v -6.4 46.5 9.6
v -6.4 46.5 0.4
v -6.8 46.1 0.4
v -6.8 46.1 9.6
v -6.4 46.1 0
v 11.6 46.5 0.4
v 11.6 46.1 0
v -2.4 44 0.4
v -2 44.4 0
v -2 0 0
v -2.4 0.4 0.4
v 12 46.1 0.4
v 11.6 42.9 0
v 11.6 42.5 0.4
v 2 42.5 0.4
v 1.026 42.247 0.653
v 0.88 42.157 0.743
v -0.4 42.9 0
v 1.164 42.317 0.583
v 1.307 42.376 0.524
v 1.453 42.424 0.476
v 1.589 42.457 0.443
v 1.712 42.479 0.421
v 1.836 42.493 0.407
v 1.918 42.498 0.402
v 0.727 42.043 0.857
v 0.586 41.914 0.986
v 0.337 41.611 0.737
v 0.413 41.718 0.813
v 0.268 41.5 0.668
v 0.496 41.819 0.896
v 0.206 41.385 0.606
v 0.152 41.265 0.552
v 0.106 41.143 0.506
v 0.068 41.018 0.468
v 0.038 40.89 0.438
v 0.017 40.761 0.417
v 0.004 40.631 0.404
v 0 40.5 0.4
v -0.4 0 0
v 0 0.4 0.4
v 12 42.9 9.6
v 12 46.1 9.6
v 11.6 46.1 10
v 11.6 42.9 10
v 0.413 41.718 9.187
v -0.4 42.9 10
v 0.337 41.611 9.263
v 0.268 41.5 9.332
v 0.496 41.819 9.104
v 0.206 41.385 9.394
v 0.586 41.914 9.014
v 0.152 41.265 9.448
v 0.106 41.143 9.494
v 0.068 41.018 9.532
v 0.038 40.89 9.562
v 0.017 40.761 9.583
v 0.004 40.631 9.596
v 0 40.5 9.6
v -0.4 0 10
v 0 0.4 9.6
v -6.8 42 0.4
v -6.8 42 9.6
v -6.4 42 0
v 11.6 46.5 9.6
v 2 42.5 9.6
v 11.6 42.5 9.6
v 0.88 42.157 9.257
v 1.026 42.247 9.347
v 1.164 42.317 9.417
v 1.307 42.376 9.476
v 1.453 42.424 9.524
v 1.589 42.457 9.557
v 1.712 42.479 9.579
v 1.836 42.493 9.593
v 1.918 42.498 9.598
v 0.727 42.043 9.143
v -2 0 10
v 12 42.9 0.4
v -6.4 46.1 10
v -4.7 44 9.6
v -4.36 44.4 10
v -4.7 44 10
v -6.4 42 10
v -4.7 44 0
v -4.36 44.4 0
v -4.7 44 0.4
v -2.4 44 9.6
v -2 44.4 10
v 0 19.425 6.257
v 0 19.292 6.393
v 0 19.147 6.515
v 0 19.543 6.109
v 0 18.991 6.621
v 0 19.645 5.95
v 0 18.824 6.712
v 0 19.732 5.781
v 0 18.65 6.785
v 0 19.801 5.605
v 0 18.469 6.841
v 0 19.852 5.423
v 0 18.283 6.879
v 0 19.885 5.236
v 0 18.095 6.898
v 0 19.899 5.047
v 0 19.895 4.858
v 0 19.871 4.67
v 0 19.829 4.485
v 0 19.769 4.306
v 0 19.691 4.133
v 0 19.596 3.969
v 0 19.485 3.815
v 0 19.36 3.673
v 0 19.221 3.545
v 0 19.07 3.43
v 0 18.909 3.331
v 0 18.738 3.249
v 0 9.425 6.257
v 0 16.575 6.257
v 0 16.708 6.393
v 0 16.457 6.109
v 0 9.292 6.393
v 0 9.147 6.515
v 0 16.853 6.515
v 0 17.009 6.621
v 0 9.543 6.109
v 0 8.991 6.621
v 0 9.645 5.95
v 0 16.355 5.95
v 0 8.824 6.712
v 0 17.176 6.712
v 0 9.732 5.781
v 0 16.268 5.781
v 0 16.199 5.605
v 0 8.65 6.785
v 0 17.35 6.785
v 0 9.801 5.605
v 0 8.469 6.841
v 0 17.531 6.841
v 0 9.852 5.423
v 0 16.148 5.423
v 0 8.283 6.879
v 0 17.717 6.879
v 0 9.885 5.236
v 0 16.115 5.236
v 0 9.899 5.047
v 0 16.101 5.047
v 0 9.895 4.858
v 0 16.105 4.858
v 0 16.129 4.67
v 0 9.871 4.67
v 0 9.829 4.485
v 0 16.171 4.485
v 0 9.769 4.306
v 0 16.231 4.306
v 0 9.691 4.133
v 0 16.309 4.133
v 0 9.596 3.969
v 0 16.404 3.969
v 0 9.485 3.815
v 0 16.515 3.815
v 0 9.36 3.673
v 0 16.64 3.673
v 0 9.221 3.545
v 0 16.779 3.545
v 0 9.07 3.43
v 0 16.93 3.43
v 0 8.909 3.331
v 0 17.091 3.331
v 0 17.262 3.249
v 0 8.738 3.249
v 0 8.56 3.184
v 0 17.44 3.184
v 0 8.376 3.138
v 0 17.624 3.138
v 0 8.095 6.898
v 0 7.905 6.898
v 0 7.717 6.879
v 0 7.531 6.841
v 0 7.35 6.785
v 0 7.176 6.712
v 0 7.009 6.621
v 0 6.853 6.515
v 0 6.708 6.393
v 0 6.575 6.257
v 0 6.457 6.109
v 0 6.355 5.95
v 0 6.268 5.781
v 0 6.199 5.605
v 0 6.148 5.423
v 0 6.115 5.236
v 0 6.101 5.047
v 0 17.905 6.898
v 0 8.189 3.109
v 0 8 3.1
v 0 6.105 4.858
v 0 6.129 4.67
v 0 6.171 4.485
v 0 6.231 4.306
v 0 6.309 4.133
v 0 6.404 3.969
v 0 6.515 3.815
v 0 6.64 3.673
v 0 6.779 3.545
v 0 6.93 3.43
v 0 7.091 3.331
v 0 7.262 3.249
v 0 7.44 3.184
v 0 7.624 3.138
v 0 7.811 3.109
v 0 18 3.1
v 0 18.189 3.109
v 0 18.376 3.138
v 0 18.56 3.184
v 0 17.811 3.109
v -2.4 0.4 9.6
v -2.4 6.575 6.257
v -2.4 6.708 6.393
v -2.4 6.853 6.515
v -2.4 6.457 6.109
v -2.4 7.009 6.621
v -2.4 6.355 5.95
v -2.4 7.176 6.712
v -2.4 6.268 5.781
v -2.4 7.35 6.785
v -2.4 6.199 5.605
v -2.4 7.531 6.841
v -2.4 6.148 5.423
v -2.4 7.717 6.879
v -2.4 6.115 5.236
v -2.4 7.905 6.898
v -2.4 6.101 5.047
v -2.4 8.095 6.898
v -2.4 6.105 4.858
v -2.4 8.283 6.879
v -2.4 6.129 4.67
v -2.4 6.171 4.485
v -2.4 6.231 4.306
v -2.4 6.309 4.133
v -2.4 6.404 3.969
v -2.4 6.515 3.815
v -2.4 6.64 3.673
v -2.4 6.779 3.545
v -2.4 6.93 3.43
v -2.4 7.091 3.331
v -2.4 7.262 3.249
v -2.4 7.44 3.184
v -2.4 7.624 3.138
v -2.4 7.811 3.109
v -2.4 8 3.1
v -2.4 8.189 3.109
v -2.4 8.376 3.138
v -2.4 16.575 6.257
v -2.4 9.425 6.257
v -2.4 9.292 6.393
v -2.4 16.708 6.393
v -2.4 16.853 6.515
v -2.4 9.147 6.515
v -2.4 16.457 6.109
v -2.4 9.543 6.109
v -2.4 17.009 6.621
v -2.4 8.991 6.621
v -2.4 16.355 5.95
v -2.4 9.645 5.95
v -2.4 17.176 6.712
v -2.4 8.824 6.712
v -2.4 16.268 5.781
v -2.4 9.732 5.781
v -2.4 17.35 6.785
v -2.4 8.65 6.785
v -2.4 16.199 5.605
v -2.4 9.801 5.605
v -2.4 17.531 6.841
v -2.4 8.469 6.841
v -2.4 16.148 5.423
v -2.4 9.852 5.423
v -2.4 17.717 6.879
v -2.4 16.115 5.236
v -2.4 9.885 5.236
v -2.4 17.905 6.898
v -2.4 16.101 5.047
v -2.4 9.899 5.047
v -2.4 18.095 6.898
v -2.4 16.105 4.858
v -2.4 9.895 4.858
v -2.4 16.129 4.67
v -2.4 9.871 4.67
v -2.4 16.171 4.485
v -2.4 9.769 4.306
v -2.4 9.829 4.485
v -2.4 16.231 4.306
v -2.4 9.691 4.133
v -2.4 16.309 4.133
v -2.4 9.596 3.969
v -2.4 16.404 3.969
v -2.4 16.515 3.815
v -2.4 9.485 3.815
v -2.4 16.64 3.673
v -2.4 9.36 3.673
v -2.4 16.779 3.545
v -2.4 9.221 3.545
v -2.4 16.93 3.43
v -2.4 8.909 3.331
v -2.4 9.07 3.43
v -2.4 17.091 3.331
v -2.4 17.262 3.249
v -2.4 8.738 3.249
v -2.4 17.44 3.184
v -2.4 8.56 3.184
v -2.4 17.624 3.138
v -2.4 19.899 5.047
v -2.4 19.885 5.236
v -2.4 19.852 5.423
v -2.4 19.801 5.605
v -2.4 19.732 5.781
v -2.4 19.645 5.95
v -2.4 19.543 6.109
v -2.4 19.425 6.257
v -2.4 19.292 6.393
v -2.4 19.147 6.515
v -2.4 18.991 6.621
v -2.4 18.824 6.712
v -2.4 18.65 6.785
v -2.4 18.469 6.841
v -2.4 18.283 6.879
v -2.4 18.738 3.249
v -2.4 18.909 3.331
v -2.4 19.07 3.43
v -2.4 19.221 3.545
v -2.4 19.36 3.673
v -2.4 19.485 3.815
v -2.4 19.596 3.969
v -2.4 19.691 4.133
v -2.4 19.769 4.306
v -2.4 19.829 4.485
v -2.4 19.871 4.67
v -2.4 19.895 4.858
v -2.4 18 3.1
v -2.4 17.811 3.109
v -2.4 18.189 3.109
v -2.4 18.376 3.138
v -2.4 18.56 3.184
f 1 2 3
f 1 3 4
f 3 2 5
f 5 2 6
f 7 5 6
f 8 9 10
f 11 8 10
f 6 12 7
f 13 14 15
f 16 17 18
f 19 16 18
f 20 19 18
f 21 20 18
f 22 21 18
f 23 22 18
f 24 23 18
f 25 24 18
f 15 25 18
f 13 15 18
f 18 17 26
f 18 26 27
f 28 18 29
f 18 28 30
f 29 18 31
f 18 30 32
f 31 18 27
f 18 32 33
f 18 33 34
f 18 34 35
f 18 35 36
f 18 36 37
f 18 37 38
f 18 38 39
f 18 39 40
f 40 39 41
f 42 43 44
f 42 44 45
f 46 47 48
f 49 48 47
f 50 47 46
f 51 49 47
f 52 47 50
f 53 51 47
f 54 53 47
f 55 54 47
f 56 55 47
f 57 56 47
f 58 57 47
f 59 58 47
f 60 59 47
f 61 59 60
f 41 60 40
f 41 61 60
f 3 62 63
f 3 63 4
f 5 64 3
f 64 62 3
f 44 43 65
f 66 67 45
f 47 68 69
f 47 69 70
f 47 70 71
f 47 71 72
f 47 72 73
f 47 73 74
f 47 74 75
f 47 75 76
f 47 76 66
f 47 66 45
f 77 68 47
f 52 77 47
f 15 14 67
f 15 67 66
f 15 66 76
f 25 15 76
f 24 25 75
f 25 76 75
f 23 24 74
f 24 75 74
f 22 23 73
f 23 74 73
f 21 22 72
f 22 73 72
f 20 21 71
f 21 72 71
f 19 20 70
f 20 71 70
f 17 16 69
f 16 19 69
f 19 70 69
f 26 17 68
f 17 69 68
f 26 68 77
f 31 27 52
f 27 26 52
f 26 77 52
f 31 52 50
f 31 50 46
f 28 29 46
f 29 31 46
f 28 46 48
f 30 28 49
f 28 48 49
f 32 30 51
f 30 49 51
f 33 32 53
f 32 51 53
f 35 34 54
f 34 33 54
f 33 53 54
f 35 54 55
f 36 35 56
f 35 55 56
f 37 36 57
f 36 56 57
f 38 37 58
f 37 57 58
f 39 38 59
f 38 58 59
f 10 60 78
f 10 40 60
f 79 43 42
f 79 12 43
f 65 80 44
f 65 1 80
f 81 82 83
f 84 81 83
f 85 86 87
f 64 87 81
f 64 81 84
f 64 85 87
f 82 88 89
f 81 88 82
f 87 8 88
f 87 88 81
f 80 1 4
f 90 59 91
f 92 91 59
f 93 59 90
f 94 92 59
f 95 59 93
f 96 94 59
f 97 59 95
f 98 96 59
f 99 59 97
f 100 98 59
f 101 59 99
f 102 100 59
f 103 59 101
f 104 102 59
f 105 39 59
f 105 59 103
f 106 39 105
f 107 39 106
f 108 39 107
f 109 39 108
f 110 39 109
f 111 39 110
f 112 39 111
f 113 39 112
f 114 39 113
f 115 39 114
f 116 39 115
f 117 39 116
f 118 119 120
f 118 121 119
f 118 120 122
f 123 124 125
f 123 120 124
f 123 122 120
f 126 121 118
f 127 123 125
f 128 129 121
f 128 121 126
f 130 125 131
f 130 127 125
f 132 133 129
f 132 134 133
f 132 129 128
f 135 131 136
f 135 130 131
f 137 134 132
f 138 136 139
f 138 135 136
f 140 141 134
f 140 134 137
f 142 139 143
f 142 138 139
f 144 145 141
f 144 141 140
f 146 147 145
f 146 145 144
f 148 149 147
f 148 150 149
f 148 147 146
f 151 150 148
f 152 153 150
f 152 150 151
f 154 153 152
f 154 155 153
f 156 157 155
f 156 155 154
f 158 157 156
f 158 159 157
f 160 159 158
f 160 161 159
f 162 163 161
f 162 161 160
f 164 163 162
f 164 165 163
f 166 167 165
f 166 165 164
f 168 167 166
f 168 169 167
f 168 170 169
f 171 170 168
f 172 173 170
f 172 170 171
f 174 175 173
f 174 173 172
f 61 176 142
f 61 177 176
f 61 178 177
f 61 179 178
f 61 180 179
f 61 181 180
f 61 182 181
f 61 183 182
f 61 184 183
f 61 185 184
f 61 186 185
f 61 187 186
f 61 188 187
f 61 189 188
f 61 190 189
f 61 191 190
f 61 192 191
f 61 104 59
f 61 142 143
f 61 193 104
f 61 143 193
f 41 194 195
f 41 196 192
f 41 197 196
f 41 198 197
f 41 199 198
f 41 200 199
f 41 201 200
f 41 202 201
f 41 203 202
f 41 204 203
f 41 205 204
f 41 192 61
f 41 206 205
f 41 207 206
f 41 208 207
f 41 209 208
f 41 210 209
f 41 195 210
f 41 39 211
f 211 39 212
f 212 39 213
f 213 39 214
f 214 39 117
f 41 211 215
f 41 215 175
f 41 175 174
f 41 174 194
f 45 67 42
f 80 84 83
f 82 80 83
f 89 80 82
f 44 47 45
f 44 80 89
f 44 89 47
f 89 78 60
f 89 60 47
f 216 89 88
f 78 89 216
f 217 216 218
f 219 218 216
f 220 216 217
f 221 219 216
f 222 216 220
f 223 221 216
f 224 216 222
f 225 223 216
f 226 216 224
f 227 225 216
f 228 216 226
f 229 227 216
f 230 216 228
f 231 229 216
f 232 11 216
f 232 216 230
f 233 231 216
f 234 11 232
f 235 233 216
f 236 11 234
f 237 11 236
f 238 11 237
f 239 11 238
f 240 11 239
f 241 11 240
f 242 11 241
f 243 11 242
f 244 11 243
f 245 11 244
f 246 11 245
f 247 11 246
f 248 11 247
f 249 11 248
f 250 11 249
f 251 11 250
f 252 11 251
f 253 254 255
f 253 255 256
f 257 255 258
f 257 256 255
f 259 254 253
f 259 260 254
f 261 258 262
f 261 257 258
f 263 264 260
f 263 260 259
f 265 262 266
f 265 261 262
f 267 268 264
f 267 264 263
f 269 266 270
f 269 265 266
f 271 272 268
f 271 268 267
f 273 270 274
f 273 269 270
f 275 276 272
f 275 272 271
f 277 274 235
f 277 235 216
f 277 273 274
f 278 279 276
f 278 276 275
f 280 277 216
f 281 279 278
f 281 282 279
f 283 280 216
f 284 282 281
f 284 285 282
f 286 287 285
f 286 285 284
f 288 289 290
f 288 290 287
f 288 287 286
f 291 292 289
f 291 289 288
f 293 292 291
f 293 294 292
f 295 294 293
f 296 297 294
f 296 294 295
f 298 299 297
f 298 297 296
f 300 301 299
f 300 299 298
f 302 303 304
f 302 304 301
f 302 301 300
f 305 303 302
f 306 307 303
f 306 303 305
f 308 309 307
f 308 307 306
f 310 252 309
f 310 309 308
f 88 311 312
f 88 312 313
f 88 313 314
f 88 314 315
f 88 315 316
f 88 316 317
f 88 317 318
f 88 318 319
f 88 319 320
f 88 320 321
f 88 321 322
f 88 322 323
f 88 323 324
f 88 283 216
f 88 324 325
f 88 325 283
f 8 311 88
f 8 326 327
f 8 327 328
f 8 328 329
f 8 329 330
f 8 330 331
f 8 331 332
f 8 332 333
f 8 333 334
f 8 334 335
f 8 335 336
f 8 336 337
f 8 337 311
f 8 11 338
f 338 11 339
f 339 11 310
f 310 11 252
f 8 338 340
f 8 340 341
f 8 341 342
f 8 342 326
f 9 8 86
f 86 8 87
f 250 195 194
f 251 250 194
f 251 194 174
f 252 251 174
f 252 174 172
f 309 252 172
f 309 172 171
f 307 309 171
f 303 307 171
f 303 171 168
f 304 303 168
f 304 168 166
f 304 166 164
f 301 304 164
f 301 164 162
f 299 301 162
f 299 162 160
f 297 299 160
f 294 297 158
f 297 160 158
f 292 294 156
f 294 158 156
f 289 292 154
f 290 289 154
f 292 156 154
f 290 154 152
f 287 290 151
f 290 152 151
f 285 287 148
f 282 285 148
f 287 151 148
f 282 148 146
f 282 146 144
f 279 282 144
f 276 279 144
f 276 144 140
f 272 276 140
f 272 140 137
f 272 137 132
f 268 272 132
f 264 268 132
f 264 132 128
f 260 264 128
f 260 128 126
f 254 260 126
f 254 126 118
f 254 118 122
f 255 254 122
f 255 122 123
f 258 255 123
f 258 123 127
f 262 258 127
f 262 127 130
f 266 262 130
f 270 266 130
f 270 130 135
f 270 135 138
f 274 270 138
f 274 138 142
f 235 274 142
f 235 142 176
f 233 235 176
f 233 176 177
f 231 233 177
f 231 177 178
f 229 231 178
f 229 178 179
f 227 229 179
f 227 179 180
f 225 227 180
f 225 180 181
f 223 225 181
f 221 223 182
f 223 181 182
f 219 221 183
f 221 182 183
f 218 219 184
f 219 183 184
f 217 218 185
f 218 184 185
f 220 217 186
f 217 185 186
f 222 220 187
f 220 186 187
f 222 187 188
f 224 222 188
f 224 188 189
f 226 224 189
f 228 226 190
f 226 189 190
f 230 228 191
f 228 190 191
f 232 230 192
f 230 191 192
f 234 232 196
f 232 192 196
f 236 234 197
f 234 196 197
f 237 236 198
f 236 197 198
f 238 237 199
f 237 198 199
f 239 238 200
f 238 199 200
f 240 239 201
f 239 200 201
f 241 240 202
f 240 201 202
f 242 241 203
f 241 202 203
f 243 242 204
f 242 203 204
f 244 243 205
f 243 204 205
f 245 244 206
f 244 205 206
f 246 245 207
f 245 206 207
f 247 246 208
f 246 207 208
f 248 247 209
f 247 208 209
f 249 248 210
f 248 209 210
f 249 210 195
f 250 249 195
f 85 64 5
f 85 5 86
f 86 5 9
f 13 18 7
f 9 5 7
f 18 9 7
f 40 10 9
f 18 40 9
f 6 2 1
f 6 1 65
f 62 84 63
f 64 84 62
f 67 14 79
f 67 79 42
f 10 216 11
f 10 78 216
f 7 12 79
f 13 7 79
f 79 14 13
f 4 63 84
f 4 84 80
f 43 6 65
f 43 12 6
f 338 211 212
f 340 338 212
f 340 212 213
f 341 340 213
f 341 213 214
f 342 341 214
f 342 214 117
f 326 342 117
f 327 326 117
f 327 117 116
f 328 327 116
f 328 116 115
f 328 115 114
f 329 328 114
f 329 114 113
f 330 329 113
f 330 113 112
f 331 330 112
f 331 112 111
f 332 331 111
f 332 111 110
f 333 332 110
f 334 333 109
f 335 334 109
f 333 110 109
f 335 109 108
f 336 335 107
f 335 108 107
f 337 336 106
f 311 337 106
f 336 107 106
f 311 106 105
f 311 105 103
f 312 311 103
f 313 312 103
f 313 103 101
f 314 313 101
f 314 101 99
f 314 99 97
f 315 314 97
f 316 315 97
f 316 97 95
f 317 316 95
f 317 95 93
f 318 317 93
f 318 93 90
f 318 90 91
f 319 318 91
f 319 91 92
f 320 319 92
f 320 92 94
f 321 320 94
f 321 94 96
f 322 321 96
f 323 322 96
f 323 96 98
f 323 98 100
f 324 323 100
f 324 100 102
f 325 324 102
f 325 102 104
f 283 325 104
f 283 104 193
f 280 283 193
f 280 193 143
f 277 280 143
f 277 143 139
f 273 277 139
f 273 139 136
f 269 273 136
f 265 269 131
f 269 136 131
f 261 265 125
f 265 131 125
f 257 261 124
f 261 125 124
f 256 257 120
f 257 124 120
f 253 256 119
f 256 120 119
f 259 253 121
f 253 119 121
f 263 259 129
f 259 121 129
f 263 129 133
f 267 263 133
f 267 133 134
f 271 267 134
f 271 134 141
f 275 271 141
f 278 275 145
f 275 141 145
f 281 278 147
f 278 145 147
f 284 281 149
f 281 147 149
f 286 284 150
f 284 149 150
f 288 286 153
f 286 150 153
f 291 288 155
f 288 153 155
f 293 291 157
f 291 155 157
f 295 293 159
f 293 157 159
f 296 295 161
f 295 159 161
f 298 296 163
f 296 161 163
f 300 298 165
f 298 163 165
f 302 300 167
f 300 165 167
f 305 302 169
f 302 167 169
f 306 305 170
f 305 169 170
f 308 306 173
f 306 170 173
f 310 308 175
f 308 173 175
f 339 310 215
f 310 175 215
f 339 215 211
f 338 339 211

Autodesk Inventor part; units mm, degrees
ref_plane "YZ Plane" through (0, 0, 0) normal (1, 0, 0) x (0, 1, 0)
ref_plane "XZ Plane" through (0, 0, 0) normal (0, 1, 0) x (-1, 0, 0)
ref_plane "XY Plane" through (0, 0, 0) normal (0, 0, 1) x (1, 0, 0)
sketch "Sketch1" plane through (0, 0, 0) normal (0, 0, 1) x (1, 0, 0)
  line L0 (-2.4, 0) -> (-2.4, 44)
  line L1 (-2.4, 44) -> (-4.7, 44)
  line L2 (-4.7, 44) -> (-6.4, 42)
  line L3 (-6.4, 42) -> (-6.8, 42)
  line L4 (-6.8, 42) -> (-6.8, 46.5)
  line L5 (-6.8, 46.5) -> (12, 46.5)
  line L6 (12, 46.5) -> (12, 42.5)
  line L7 (12, 42.5) -> (0, 42.5)
  line L8 (0, 42.5) -> (0, 0)
  line L9 (0, 0) -> (-2.4, 0)
  dimension "d0" = 44
  dimension "d3" = 2.4
  dimension "d5" = 2.5
  dimension "d6" = 4
  dimension "d7" = 12
  dimension "d19" = 18.8
  dimension "d20" = 0.4
  dimension "d21" = 2
  dimension "d22" = 2.3
extrude "Extrusion1" add sketch "Sketch1" along normal blind 10
sketch "Sketch2" plane through (0, 0, 0) normal (1, 0, 0) x (0, 0, -1)
  circle A0 centre (-5, 8) radius 1.9
  line L0 (0, 0) -> (-10, 0) projected
  line L1 (-10, 0) -> (-10, 42.5) projected
  line L2 (0, 42.5) -> (-10, 42.5) projected
  circle A1 centre (-5, 18) radius 1.9
  dimension "d10" = 3.8
  dimension "d11" = 8
  dimension "d12" = 5
  dimension "d23" = 34.5
  dimension "d26" = 10
extrude "Extrusion3" cut sketch "Sketch2" against normal through all
chamfer "Chamfer1" distance 0.4 angle 45 19 edges at (0, 21.25, 10) (0, 0, 5) (0, 21.25, 0) (6, 42.5, 0) (6, 42.5, 10) (12, 42.5, 5) (12, 46.5, 5) (12, 44.5, 10) (12, 44.5, 0) (-6.8, 46.5, 5) (2.6, 46.5, 10) (2.6, 46.5, 0) (-6.8, 44.25, 0) (-6.8, 44.25, 10) (-2.4, 22, 0) (-2.4, 0, 5) (-2.4, 22, 10) (-3.55, 44, 10) (-3.55, 44, 0)
fillet "Fillet1" radius 2 1 edges at (0, 42.5, 5)
properties part number "Battery Latch"
